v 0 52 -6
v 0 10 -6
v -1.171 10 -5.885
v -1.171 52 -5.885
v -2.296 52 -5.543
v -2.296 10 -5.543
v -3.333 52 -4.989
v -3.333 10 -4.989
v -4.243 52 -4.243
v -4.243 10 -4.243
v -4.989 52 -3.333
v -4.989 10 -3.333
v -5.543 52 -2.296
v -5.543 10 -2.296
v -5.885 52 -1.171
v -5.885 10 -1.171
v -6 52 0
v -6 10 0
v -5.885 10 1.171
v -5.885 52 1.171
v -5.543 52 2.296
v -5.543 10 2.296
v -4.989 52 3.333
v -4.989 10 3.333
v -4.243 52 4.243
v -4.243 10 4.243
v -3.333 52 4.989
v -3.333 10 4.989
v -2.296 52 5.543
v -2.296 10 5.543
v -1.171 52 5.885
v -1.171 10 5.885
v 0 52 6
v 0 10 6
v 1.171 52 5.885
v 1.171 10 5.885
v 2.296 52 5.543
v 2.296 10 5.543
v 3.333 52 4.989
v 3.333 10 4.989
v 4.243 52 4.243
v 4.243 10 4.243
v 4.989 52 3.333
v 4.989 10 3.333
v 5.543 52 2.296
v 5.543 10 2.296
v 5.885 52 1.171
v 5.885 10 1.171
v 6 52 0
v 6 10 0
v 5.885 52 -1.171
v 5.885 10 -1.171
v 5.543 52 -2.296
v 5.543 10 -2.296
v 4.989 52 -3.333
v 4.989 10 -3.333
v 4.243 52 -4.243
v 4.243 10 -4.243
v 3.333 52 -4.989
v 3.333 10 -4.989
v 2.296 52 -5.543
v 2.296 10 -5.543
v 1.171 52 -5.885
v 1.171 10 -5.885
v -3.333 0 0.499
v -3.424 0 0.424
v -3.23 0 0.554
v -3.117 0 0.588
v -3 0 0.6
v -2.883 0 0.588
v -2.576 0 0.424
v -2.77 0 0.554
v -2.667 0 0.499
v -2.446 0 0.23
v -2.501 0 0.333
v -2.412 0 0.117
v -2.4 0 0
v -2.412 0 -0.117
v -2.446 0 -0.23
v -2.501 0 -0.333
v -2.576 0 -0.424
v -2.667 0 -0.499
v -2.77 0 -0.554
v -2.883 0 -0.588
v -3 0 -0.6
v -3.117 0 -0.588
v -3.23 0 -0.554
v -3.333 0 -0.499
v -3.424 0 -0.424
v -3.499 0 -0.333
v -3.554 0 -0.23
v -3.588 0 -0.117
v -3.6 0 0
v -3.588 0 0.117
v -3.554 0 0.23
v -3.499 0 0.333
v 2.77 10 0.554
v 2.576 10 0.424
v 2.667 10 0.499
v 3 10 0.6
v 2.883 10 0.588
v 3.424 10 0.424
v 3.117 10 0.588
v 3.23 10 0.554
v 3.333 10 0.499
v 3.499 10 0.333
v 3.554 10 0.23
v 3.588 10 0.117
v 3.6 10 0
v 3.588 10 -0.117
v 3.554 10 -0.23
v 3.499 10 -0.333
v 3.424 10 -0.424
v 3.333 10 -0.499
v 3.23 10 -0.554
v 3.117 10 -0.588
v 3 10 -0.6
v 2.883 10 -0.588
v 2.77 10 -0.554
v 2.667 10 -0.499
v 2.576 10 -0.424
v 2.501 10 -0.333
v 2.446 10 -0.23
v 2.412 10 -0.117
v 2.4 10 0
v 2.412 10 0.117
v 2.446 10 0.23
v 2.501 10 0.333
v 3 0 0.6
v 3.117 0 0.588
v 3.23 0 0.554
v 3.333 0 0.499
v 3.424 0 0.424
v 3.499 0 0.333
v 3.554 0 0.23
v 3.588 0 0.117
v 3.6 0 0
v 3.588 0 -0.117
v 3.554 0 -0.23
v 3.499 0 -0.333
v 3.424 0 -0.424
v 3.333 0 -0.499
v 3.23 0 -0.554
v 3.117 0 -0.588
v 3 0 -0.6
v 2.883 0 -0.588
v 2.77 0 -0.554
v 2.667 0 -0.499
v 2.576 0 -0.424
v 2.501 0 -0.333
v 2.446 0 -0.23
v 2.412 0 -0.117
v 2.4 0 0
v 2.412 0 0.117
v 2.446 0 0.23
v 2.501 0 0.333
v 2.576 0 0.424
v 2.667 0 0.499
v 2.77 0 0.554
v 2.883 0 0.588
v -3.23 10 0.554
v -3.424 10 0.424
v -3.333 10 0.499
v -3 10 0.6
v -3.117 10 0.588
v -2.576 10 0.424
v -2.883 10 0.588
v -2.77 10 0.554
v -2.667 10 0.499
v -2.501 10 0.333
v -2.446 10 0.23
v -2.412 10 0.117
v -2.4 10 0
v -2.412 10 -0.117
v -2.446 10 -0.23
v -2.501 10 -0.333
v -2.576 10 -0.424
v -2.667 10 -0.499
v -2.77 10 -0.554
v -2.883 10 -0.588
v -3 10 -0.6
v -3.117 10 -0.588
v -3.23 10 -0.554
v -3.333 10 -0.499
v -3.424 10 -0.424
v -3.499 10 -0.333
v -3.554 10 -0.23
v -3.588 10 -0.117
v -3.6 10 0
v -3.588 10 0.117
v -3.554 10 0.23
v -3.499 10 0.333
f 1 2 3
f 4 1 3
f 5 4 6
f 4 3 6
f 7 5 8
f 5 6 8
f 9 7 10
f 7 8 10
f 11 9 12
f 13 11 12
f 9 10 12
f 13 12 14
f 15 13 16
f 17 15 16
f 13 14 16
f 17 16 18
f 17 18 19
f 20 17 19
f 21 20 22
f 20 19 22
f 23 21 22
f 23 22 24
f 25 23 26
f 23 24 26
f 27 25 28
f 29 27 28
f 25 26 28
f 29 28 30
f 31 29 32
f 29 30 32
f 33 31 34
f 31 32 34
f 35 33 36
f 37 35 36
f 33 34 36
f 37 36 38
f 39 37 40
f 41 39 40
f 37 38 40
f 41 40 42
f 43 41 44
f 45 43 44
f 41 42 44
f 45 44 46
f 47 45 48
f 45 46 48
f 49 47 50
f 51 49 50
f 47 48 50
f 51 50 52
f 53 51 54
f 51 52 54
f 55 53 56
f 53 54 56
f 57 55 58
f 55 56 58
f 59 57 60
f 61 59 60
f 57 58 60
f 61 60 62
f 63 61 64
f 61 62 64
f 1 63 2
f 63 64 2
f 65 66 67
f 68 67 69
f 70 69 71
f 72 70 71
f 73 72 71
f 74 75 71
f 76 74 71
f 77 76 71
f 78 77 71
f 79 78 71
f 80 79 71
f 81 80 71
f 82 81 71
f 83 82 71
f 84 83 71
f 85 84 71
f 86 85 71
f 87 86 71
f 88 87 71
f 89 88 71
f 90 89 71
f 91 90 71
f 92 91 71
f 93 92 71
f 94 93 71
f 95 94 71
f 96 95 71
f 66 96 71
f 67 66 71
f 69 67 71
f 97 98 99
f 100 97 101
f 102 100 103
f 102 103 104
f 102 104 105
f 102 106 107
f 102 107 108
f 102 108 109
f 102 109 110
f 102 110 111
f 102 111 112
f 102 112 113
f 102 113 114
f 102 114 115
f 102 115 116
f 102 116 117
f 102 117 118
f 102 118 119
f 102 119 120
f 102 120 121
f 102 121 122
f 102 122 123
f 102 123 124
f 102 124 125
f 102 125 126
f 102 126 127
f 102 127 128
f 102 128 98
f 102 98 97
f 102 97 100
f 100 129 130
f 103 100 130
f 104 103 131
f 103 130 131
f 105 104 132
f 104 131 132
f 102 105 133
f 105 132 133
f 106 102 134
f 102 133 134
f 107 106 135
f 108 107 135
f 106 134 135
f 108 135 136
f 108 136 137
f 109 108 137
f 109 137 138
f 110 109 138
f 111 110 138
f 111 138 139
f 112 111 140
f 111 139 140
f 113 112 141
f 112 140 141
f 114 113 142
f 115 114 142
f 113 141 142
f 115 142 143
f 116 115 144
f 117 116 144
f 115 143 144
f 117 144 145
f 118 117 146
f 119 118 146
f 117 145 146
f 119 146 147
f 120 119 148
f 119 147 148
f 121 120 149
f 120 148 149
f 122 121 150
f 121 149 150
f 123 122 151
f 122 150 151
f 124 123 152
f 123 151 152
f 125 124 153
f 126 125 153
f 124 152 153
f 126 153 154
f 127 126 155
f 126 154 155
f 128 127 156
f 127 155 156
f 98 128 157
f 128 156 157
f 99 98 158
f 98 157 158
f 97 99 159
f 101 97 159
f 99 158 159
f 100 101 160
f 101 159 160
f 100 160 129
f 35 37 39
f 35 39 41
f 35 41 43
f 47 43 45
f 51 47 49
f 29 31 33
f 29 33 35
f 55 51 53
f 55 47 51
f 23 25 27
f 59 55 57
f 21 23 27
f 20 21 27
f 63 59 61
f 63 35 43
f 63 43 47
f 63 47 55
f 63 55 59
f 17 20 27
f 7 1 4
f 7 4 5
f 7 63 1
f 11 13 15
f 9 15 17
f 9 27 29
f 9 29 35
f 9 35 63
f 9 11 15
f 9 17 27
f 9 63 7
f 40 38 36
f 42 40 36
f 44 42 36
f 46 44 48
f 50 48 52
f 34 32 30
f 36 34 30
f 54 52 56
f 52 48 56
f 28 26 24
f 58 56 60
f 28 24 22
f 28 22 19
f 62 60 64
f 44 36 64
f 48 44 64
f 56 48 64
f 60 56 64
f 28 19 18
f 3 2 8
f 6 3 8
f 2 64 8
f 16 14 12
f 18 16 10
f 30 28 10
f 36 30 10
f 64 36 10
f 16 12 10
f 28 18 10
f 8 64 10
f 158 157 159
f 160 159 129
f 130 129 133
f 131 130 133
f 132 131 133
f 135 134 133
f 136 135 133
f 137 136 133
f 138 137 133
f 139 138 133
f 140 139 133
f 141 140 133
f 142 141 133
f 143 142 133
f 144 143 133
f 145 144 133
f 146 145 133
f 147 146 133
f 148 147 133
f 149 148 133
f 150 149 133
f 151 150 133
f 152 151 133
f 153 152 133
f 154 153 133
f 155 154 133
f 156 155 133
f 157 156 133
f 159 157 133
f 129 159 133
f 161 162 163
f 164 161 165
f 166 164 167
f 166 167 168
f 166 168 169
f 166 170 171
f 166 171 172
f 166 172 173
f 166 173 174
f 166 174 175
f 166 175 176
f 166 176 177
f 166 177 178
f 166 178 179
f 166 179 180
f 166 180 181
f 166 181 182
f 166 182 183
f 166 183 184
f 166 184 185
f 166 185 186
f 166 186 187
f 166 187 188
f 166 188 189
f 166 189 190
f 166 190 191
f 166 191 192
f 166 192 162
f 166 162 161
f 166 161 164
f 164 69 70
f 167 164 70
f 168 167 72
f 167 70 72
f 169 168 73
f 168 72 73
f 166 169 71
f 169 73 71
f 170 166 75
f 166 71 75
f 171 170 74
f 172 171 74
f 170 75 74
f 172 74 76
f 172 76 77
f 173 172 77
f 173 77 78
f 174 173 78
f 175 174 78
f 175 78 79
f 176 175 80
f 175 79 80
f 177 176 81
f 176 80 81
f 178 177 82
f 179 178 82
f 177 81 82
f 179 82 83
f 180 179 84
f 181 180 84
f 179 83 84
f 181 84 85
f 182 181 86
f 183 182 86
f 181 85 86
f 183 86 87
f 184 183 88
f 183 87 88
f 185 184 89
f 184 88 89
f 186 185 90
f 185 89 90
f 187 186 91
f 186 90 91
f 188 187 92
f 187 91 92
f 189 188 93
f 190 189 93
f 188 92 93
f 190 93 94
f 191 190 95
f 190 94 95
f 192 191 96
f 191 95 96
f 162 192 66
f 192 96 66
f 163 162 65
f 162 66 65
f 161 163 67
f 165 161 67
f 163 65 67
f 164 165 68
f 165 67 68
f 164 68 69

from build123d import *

# Parameters (mm, degrees)
SK_ELECTRODE_PINS_R    = 0.6
ELECTRODE_PINS_DEPTH   = 10
ELECTRODE_PINS_2_DEPTH = 10
PROBE_START            = 10
SK_PROBE_BODY_R        = 6
PROBE_BODY_DEPTH       = 42


with BuildPart() as part:
    # SK Electrode pins → Electrode pins (new body)
    with BuildSketch(Plane(origin=(0, 0, 0), x_dir=(1, 0, 0), z_dir=(0, 1, 0))):
        with Locations((-3, 0)):
            Circle(SK_ELECTRODE_PINS_R)
    extrude(amount=ELECTRODE_PINS_DEPTH)


with BuildPart() as body_2:
    # SK Electrode pins → Electrode pins 2 (new body)
    with BuildSketch(Plane(origin=(0, 0, 0), x_dir=(1, 0, 0), z_dir=(0, 1, 0))):
        with Locations((3, 0)):
            Circle(SK_ELECTRODE_PINS_R)
    extrude(amount=ELECTRODE_PINS_2_DEPTH)


with BuildPart() as body_3:
    # SK Probe body → Probe body (new body)
    with BuildSketch(Plane(origin=(0, 0, 0), x_dir=(1, 0, 0), z_dir=(0, 1, 0)).offset(PROBE_START)):
        Circle(SK_PROBE_BODY_R)
    extrude(amount=PROBE_BODY_DEPTH)


solid = Compound([part.part, body_2.part, body_3.part])
